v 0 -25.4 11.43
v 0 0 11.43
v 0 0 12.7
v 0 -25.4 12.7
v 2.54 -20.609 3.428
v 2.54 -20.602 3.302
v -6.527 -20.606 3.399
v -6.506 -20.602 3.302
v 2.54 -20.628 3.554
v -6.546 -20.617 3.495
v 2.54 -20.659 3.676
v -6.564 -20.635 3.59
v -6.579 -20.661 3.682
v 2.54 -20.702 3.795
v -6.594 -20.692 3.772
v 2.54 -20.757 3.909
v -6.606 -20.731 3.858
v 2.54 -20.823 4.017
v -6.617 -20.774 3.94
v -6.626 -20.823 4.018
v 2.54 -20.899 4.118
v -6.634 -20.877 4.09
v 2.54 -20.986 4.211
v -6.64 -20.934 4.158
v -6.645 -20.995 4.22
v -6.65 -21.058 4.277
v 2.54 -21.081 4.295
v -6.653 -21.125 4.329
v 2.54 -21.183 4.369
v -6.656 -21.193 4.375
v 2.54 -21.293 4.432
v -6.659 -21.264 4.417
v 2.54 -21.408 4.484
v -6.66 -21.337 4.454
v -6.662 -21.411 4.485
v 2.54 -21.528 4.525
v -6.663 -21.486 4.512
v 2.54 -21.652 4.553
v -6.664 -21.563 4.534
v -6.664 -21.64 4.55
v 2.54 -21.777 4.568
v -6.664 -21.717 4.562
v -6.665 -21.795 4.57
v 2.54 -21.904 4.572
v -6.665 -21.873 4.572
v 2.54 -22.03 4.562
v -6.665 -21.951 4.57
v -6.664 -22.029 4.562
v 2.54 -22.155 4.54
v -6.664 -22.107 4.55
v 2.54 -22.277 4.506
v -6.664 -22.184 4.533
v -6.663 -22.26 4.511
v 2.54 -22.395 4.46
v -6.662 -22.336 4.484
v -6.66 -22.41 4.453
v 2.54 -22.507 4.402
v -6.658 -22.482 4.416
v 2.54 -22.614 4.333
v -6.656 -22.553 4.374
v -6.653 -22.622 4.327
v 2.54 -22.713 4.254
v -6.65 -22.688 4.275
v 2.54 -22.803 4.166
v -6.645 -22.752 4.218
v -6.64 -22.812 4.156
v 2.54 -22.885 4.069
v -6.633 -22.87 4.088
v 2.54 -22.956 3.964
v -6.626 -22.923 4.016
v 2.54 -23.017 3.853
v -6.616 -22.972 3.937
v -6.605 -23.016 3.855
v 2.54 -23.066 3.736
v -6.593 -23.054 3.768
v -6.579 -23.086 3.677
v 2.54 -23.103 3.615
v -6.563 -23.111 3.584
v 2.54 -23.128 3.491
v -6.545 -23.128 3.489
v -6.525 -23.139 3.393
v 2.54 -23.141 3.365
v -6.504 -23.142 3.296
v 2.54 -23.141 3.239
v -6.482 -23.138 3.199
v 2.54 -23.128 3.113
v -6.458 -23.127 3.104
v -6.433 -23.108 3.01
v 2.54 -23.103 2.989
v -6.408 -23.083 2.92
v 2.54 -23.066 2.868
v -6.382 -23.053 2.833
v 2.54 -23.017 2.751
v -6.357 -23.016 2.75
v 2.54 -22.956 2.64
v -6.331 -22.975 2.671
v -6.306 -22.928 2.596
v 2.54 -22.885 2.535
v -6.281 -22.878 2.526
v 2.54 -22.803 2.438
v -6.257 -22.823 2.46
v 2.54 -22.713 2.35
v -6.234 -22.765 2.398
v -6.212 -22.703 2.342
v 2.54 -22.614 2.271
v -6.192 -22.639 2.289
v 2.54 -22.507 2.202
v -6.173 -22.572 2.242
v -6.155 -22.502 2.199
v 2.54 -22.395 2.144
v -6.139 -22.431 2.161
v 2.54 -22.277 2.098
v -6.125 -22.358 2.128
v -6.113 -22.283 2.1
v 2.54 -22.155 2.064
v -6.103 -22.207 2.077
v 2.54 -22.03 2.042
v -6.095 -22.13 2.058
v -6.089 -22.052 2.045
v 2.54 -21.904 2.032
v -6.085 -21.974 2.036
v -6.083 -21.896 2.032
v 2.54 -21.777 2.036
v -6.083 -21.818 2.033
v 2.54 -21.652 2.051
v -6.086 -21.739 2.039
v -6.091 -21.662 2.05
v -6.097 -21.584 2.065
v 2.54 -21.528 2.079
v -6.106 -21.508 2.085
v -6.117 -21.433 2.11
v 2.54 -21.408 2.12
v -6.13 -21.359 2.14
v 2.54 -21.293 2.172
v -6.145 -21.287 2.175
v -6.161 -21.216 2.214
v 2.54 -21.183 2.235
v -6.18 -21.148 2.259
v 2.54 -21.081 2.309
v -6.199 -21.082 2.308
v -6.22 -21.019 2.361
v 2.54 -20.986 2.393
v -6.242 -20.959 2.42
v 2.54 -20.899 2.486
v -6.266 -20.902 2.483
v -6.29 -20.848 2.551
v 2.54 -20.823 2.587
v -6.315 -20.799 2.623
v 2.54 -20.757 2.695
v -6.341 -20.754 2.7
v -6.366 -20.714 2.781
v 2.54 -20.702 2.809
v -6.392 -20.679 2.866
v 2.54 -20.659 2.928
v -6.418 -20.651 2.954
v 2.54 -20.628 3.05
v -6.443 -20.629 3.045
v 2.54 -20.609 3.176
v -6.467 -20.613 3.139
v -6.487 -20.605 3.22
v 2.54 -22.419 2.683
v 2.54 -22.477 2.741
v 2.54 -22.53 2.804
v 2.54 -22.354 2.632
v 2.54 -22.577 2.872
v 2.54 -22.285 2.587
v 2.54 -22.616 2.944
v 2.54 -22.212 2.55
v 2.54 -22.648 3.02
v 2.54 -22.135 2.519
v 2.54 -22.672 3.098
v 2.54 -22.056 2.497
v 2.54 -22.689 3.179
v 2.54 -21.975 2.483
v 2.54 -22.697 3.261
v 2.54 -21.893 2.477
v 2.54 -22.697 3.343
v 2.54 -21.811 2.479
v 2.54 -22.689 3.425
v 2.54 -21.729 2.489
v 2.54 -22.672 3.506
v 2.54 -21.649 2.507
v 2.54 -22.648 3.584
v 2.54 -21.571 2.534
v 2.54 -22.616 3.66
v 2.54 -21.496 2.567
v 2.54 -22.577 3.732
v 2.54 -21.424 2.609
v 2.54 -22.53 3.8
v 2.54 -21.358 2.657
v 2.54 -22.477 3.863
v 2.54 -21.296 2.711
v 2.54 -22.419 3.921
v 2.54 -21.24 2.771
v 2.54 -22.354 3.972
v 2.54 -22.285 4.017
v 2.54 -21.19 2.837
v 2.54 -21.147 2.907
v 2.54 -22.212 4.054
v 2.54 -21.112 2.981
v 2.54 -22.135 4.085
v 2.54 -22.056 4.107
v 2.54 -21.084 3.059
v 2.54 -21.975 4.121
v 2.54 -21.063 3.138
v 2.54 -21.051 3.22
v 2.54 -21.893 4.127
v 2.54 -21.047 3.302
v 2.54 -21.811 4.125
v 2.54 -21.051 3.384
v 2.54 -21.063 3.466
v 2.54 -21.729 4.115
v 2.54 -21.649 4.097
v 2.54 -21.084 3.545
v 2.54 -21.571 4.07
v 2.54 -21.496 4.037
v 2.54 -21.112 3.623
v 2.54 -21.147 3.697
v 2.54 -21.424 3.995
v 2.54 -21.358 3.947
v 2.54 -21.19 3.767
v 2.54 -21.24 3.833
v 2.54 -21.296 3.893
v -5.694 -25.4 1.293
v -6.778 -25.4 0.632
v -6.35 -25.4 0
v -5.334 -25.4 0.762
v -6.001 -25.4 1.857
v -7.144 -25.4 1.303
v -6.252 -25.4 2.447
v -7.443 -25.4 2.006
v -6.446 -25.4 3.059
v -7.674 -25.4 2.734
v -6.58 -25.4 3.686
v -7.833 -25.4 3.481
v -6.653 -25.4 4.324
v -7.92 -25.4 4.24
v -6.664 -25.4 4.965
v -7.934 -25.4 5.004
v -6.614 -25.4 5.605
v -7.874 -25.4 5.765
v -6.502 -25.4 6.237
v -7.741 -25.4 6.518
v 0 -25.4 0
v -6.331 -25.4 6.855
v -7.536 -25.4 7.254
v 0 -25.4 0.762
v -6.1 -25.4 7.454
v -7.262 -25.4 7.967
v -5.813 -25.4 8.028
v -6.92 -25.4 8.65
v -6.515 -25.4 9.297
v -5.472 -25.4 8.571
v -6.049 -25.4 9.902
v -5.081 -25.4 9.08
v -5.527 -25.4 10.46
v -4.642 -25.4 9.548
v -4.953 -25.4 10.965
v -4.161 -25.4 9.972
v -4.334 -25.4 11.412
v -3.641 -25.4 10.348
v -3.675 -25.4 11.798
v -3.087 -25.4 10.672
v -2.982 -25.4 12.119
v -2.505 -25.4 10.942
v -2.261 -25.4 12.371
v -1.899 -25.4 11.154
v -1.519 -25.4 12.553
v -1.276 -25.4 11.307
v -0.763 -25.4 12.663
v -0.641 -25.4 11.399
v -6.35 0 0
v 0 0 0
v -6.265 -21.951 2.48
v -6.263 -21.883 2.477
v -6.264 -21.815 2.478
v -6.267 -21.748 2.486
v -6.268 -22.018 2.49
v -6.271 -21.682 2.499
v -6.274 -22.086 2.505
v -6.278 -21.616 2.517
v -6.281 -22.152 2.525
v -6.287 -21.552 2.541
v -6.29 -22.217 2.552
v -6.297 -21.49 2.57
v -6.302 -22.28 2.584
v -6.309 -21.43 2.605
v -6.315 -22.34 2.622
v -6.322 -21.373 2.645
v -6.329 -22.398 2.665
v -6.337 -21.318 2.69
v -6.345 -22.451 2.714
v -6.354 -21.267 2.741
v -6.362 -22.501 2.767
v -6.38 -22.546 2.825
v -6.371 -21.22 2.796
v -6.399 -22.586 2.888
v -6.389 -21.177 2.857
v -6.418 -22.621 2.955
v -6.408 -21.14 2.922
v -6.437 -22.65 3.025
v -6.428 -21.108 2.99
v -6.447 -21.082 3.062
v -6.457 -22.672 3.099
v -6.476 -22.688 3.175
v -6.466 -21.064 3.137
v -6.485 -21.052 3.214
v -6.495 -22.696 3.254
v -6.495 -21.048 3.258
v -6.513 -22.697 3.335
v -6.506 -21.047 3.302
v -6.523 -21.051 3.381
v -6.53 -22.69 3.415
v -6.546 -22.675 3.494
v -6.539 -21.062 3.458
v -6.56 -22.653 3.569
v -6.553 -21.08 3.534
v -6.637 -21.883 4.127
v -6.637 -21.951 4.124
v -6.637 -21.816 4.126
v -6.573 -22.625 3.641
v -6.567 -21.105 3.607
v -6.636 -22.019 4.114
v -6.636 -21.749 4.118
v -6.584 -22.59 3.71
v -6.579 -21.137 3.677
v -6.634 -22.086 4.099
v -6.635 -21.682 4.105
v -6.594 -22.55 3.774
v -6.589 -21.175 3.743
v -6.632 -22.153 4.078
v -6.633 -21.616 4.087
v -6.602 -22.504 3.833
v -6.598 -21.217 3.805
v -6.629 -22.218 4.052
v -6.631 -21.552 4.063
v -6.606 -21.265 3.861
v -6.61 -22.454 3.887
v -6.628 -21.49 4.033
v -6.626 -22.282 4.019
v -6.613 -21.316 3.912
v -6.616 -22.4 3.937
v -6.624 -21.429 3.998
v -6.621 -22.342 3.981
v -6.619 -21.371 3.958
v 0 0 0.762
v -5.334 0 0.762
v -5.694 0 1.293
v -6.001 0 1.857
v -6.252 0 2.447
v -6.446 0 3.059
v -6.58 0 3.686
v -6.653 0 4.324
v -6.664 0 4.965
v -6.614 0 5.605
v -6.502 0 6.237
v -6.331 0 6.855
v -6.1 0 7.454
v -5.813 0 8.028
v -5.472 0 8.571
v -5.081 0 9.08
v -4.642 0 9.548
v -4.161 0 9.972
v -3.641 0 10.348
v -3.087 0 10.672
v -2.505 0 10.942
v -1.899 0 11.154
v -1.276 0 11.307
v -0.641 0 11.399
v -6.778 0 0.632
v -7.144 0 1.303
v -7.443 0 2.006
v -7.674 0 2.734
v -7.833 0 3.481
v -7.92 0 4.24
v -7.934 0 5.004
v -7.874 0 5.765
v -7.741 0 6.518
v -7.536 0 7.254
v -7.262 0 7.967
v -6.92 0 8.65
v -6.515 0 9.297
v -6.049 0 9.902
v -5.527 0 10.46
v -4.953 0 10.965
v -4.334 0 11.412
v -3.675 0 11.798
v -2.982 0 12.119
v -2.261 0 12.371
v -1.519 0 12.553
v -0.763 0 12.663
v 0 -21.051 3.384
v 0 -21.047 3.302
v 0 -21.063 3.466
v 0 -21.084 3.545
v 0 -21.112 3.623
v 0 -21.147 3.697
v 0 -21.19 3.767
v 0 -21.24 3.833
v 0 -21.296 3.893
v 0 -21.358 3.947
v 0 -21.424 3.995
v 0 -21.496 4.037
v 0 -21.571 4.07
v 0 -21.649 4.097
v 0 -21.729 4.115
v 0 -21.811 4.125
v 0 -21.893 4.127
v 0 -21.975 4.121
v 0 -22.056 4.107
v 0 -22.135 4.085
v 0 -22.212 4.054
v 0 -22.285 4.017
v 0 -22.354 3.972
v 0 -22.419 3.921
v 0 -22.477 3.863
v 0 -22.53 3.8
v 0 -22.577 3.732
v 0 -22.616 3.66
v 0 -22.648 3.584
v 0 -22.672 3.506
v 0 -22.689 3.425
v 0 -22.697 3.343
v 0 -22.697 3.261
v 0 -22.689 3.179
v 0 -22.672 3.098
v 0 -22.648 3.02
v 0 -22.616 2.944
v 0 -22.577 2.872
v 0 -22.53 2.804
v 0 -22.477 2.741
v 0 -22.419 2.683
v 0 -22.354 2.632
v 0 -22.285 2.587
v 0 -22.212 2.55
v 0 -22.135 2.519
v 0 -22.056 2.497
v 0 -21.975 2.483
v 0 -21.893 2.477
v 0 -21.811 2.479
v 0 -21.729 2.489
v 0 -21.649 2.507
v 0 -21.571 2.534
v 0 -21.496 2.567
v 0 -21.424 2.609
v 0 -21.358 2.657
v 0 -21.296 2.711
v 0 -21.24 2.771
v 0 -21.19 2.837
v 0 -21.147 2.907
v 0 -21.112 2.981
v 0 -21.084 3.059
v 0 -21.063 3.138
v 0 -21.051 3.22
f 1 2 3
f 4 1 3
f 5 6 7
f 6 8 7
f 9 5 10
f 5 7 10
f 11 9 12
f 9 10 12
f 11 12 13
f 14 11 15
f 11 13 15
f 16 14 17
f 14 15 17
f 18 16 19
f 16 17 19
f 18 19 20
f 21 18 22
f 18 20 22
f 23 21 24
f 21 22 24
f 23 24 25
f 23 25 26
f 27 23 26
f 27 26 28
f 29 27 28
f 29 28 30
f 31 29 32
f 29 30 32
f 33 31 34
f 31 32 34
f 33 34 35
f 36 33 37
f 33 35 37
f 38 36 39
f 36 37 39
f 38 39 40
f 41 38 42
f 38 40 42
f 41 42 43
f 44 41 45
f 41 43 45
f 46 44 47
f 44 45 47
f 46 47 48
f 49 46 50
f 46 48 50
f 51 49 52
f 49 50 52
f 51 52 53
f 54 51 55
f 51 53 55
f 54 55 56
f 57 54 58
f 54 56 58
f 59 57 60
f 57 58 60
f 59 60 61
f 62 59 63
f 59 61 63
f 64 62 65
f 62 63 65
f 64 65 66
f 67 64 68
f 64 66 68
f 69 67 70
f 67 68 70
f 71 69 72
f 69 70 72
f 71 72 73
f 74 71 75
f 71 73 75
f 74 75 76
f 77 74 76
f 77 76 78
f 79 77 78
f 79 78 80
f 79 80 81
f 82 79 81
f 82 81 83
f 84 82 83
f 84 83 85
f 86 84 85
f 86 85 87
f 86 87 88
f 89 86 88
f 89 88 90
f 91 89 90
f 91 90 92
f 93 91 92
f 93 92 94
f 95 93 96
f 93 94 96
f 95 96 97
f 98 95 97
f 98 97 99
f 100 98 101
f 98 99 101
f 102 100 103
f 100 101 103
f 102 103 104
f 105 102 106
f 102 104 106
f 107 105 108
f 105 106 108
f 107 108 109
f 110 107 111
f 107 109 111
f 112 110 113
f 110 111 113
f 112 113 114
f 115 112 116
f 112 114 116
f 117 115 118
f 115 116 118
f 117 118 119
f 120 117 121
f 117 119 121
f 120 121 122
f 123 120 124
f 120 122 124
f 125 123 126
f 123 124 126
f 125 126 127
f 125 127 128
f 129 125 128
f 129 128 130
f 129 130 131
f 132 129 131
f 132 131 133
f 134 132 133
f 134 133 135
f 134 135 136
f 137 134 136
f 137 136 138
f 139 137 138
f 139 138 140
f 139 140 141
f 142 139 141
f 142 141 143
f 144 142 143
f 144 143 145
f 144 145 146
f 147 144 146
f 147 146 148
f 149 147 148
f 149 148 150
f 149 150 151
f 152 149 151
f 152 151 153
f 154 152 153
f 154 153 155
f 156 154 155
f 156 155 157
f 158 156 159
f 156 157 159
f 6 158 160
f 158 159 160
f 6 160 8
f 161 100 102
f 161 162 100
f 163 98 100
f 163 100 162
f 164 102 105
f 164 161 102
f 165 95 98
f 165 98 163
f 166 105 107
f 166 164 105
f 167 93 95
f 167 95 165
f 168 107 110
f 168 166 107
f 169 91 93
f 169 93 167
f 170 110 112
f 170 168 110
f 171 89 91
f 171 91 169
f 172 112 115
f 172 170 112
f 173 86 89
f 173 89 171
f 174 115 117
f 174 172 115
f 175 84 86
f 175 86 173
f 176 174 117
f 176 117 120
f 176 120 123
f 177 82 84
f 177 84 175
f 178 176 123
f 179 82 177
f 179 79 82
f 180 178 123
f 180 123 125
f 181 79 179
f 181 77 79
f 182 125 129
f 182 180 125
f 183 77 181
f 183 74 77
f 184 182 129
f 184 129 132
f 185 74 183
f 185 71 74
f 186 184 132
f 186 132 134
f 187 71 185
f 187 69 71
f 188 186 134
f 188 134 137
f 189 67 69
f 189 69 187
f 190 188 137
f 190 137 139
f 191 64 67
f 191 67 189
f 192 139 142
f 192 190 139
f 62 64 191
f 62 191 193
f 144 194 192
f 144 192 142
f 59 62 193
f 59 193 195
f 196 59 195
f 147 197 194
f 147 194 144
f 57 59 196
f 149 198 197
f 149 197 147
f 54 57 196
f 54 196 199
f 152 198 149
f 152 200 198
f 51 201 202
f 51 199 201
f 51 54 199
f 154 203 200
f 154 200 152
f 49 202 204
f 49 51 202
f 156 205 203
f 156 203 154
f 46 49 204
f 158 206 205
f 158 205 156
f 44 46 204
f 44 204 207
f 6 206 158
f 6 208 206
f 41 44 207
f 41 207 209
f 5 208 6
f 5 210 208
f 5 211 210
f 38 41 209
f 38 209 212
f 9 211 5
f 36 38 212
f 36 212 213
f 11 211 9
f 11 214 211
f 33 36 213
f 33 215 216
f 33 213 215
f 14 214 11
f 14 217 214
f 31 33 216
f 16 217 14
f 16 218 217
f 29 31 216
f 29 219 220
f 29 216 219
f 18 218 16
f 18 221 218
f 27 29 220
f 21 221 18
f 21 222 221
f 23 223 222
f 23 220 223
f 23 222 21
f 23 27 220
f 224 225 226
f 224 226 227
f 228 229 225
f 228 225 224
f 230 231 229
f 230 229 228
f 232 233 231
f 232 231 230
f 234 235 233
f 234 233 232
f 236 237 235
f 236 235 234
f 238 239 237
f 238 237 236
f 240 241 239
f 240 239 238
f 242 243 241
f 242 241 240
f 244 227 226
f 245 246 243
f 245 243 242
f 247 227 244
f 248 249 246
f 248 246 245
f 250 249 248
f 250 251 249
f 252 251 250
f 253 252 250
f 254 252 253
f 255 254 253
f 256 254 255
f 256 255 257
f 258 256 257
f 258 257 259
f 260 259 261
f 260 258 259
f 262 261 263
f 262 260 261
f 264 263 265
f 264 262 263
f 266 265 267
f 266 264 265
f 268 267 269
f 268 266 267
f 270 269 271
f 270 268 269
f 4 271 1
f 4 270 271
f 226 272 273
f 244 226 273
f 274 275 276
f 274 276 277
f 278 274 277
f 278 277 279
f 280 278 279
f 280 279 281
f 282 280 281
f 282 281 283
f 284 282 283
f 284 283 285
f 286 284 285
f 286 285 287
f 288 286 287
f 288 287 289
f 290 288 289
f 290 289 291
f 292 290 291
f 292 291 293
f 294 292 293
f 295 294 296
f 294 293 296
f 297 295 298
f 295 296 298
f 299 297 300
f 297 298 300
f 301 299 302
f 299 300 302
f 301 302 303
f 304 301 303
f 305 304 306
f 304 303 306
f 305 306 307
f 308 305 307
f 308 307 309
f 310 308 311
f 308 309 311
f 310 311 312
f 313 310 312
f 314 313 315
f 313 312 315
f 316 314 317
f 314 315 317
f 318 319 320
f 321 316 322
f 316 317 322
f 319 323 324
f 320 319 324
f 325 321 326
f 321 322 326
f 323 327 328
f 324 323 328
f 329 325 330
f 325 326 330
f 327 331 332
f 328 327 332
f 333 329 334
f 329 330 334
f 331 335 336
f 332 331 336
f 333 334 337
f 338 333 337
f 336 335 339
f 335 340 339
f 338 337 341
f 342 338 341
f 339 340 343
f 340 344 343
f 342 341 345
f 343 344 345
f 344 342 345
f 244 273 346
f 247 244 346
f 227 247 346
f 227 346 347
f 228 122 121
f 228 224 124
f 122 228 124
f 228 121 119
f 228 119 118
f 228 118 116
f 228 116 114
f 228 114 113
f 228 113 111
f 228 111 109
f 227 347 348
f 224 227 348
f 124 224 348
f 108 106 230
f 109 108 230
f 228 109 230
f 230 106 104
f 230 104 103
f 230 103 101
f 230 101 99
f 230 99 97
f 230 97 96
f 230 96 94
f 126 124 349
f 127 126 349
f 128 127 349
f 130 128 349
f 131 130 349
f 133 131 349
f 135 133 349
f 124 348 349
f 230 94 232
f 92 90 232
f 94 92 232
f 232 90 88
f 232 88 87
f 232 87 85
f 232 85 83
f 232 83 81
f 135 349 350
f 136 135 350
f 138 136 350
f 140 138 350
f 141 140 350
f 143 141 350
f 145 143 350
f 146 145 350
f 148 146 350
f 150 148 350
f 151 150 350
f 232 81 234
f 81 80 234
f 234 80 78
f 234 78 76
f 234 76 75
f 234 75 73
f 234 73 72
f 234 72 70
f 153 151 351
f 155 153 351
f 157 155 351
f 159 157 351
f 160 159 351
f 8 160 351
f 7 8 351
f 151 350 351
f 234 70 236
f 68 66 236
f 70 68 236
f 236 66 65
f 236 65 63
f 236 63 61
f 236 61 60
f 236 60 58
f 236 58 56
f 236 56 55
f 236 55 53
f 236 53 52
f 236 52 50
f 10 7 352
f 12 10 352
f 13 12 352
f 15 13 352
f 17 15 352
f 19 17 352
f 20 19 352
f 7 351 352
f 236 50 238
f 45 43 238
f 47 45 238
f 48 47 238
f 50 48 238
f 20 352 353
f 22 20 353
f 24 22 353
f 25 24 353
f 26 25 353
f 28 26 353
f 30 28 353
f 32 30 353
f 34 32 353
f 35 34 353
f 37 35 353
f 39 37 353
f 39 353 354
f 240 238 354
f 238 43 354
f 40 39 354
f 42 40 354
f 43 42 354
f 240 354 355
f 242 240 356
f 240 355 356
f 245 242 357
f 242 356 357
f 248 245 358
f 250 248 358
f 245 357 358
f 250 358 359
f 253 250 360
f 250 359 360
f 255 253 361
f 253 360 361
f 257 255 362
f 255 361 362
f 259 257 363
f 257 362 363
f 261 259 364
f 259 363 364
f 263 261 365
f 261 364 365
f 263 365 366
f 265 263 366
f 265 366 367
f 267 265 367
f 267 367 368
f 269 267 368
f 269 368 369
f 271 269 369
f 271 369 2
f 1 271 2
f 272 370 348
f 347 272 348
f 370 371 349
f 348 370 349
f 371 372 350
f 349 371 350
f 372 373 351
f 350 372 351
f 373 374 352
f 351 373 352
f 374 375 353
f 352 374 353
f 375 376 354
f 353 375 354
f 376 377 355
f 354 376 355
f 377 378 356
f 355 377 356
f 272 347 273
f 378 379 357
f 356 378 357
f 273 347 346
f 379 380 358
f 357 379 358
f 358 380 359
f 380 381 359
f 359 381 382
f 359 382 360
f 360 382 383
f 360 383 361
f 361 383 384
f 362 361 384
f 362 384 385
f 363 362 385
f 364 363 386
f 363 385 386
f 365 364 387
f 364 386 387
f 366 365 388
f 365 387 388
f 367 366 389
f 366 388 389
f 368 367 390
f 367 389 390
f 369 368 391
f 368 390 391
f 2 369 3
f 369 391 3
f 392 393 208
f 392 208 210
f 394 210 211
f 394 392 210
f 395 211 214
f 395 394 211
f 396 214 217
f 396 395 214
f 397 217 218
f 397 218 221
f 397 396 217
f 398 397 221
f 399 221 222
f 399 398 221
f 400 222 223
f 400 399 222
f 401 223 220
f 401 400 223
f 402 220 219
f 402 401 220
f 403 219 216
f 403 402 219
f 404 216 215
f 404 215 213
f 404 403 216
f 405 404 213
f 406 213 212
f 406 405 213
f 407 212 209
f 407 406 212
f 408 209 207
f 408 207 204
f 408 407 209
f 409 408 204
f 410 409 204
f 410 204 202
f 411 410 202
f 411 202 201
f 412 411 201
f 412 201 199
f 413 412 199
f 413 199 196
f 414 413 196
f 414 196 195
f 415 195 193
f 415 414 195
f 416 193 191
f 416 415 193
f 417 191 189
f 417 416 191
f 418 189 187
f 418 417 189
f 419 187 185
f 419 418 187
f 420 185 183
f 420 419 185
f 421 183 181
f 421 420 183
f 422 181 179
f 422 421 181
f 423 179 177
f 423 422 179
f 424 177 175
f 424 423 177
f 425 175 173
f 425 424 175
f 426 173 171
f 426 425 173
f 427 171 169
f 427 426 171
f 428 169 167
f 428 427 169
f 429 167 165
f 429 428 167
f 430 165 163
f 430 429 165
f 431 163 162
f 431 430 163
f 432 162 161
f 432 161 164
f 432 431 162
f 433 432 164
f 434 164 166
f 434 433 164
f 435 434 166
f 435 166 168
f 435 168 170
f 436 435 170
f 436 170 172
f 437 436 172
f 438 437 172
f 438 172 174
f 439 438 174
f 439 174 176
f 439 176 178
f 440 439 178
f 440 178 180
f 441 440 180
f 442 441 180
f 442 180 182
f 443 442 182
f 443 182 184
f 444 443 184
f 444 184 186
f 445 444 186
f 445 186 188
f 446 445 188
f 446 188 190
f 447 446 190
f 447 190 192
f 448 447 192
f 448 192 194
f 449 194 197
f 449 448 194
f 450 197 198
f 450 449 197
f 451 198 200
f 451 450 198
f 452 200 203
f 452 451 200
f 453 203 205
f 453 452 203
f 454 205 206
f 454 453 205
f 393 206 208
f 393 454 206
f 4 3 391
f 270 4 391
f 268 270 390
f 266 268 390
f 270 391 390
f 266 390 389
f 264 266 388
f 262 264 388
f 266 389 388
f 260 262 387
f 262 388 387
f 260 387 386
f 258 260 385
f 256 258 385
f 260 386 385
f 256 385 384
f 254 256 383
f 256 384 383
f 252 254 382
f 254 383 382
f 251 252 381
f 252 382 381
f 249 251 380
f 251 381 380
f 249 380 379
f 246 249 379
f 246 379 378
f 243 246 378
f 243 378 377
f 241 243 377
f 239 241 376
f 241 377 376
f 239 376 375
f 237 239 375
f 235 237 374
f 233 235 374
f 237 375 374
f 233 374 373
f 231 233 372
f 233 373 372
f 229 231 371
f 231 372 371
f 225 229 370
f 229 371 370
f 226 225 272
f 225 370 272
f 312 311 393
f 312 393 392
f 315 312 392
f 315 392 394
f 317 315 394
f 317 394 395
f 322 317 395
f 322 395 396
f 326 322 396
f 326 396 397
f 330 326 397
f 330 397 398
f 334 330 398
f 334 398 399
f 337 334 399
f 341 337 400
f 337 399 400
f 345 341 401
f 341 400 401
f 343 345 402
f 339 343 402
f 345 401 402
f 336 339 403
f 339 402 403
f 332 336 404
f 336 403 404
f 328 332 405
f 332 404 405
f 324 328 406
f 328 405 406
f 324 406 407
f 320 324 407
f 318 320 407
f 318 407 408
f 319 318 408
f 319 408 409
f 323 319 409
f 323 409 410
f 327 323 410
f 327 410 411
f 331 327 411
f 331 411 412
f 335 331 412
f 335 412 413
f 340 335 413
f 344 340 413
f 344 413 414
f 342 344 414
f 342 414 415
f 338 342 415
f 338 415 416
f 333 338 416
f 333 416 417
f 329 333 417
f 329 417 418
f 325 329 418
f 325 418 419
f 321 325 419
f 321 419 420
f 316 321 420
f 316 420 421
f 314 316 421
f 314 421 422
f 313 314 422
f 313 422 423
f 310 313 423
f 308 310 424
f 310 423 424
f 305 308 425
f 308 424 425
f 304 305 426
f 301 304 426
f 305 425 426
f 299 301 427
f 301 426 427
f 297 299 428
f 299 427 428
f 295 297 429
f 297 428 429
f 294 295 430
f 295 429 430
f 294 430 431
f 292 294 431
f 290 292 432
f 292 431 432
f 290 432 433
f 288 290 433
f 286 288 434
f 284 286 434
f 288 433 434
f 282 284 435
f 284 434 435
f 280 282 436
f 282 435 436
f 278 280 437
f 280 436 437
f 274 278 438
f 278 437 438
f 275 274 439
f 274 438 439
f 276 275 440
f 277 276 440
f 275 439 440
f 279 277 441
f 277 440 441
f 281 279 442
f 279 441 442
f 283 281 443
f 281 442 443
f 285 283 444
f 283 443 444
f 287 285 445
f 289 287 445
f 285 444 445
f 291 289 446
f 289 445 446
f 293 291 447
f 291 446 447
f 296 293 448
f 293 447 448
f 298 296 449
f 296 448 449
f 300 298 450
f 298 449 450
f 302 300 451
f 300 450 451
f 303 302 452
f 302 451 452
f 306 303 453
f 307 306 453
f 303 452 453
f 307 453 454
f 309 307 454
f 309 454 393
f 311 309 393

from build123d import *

# Parameters (mm, degrees)
F1_DEPTH    = 25.4
F2_R        = 1.27
F2_R_2      = 0.8255
F3_DEPTH    = 7.112
F3_FACE_R   = 1.27
F3_FACE_R_2 = 0.8255
F4_DEPTH    = 2.54


with BuildPart() as f1:
    # F0 (on Front) → F1 (new body)
    with BuildSketch(Plane.XZ):
        with BuildLine():
            Line((-6.35, 0), (0, 0))
            Line((0, 0), (0, 0.762))
            Line((0, 0.762), (-5.334, 0.762))
            ThreePointArc((-5.334, 0.762), (-5.963593, 7.744297), (0, 11.43))
            Line((0, 11.43), (0, 12.7))
            ThreePointArc((0, 12.7), (-7.099516, 8.312258), (-6.35, 0))
        make_face()
    extrude(amount=F1_DEPTH)

    # F2 (on Right) → F3 (join)
    with BuildSketch(Plane.YZ):
        with Locations((-21.872345, 3.302)):
            Circle(F2_R)
        with Locations((-21.872345, 3.302)):
            Circle(F2_R_2, mode=Mode.SUBTRACT)
    extrude(amount=-F3_DEPTH)

    # F3_face (on face) → F4 (join)
    with BuildSketch(Plane(origin=(0, -21.872345, 3.302), x_dir=(0, 1, 0), z_dir=(1, 0, 0))):
        Circle(F3_FACE_R)
        Circle(F3_FACE_R_2, mode=Mode.SUBTRACT)
    extrude(amount=F4_DEPTH)


solid = f1.part
